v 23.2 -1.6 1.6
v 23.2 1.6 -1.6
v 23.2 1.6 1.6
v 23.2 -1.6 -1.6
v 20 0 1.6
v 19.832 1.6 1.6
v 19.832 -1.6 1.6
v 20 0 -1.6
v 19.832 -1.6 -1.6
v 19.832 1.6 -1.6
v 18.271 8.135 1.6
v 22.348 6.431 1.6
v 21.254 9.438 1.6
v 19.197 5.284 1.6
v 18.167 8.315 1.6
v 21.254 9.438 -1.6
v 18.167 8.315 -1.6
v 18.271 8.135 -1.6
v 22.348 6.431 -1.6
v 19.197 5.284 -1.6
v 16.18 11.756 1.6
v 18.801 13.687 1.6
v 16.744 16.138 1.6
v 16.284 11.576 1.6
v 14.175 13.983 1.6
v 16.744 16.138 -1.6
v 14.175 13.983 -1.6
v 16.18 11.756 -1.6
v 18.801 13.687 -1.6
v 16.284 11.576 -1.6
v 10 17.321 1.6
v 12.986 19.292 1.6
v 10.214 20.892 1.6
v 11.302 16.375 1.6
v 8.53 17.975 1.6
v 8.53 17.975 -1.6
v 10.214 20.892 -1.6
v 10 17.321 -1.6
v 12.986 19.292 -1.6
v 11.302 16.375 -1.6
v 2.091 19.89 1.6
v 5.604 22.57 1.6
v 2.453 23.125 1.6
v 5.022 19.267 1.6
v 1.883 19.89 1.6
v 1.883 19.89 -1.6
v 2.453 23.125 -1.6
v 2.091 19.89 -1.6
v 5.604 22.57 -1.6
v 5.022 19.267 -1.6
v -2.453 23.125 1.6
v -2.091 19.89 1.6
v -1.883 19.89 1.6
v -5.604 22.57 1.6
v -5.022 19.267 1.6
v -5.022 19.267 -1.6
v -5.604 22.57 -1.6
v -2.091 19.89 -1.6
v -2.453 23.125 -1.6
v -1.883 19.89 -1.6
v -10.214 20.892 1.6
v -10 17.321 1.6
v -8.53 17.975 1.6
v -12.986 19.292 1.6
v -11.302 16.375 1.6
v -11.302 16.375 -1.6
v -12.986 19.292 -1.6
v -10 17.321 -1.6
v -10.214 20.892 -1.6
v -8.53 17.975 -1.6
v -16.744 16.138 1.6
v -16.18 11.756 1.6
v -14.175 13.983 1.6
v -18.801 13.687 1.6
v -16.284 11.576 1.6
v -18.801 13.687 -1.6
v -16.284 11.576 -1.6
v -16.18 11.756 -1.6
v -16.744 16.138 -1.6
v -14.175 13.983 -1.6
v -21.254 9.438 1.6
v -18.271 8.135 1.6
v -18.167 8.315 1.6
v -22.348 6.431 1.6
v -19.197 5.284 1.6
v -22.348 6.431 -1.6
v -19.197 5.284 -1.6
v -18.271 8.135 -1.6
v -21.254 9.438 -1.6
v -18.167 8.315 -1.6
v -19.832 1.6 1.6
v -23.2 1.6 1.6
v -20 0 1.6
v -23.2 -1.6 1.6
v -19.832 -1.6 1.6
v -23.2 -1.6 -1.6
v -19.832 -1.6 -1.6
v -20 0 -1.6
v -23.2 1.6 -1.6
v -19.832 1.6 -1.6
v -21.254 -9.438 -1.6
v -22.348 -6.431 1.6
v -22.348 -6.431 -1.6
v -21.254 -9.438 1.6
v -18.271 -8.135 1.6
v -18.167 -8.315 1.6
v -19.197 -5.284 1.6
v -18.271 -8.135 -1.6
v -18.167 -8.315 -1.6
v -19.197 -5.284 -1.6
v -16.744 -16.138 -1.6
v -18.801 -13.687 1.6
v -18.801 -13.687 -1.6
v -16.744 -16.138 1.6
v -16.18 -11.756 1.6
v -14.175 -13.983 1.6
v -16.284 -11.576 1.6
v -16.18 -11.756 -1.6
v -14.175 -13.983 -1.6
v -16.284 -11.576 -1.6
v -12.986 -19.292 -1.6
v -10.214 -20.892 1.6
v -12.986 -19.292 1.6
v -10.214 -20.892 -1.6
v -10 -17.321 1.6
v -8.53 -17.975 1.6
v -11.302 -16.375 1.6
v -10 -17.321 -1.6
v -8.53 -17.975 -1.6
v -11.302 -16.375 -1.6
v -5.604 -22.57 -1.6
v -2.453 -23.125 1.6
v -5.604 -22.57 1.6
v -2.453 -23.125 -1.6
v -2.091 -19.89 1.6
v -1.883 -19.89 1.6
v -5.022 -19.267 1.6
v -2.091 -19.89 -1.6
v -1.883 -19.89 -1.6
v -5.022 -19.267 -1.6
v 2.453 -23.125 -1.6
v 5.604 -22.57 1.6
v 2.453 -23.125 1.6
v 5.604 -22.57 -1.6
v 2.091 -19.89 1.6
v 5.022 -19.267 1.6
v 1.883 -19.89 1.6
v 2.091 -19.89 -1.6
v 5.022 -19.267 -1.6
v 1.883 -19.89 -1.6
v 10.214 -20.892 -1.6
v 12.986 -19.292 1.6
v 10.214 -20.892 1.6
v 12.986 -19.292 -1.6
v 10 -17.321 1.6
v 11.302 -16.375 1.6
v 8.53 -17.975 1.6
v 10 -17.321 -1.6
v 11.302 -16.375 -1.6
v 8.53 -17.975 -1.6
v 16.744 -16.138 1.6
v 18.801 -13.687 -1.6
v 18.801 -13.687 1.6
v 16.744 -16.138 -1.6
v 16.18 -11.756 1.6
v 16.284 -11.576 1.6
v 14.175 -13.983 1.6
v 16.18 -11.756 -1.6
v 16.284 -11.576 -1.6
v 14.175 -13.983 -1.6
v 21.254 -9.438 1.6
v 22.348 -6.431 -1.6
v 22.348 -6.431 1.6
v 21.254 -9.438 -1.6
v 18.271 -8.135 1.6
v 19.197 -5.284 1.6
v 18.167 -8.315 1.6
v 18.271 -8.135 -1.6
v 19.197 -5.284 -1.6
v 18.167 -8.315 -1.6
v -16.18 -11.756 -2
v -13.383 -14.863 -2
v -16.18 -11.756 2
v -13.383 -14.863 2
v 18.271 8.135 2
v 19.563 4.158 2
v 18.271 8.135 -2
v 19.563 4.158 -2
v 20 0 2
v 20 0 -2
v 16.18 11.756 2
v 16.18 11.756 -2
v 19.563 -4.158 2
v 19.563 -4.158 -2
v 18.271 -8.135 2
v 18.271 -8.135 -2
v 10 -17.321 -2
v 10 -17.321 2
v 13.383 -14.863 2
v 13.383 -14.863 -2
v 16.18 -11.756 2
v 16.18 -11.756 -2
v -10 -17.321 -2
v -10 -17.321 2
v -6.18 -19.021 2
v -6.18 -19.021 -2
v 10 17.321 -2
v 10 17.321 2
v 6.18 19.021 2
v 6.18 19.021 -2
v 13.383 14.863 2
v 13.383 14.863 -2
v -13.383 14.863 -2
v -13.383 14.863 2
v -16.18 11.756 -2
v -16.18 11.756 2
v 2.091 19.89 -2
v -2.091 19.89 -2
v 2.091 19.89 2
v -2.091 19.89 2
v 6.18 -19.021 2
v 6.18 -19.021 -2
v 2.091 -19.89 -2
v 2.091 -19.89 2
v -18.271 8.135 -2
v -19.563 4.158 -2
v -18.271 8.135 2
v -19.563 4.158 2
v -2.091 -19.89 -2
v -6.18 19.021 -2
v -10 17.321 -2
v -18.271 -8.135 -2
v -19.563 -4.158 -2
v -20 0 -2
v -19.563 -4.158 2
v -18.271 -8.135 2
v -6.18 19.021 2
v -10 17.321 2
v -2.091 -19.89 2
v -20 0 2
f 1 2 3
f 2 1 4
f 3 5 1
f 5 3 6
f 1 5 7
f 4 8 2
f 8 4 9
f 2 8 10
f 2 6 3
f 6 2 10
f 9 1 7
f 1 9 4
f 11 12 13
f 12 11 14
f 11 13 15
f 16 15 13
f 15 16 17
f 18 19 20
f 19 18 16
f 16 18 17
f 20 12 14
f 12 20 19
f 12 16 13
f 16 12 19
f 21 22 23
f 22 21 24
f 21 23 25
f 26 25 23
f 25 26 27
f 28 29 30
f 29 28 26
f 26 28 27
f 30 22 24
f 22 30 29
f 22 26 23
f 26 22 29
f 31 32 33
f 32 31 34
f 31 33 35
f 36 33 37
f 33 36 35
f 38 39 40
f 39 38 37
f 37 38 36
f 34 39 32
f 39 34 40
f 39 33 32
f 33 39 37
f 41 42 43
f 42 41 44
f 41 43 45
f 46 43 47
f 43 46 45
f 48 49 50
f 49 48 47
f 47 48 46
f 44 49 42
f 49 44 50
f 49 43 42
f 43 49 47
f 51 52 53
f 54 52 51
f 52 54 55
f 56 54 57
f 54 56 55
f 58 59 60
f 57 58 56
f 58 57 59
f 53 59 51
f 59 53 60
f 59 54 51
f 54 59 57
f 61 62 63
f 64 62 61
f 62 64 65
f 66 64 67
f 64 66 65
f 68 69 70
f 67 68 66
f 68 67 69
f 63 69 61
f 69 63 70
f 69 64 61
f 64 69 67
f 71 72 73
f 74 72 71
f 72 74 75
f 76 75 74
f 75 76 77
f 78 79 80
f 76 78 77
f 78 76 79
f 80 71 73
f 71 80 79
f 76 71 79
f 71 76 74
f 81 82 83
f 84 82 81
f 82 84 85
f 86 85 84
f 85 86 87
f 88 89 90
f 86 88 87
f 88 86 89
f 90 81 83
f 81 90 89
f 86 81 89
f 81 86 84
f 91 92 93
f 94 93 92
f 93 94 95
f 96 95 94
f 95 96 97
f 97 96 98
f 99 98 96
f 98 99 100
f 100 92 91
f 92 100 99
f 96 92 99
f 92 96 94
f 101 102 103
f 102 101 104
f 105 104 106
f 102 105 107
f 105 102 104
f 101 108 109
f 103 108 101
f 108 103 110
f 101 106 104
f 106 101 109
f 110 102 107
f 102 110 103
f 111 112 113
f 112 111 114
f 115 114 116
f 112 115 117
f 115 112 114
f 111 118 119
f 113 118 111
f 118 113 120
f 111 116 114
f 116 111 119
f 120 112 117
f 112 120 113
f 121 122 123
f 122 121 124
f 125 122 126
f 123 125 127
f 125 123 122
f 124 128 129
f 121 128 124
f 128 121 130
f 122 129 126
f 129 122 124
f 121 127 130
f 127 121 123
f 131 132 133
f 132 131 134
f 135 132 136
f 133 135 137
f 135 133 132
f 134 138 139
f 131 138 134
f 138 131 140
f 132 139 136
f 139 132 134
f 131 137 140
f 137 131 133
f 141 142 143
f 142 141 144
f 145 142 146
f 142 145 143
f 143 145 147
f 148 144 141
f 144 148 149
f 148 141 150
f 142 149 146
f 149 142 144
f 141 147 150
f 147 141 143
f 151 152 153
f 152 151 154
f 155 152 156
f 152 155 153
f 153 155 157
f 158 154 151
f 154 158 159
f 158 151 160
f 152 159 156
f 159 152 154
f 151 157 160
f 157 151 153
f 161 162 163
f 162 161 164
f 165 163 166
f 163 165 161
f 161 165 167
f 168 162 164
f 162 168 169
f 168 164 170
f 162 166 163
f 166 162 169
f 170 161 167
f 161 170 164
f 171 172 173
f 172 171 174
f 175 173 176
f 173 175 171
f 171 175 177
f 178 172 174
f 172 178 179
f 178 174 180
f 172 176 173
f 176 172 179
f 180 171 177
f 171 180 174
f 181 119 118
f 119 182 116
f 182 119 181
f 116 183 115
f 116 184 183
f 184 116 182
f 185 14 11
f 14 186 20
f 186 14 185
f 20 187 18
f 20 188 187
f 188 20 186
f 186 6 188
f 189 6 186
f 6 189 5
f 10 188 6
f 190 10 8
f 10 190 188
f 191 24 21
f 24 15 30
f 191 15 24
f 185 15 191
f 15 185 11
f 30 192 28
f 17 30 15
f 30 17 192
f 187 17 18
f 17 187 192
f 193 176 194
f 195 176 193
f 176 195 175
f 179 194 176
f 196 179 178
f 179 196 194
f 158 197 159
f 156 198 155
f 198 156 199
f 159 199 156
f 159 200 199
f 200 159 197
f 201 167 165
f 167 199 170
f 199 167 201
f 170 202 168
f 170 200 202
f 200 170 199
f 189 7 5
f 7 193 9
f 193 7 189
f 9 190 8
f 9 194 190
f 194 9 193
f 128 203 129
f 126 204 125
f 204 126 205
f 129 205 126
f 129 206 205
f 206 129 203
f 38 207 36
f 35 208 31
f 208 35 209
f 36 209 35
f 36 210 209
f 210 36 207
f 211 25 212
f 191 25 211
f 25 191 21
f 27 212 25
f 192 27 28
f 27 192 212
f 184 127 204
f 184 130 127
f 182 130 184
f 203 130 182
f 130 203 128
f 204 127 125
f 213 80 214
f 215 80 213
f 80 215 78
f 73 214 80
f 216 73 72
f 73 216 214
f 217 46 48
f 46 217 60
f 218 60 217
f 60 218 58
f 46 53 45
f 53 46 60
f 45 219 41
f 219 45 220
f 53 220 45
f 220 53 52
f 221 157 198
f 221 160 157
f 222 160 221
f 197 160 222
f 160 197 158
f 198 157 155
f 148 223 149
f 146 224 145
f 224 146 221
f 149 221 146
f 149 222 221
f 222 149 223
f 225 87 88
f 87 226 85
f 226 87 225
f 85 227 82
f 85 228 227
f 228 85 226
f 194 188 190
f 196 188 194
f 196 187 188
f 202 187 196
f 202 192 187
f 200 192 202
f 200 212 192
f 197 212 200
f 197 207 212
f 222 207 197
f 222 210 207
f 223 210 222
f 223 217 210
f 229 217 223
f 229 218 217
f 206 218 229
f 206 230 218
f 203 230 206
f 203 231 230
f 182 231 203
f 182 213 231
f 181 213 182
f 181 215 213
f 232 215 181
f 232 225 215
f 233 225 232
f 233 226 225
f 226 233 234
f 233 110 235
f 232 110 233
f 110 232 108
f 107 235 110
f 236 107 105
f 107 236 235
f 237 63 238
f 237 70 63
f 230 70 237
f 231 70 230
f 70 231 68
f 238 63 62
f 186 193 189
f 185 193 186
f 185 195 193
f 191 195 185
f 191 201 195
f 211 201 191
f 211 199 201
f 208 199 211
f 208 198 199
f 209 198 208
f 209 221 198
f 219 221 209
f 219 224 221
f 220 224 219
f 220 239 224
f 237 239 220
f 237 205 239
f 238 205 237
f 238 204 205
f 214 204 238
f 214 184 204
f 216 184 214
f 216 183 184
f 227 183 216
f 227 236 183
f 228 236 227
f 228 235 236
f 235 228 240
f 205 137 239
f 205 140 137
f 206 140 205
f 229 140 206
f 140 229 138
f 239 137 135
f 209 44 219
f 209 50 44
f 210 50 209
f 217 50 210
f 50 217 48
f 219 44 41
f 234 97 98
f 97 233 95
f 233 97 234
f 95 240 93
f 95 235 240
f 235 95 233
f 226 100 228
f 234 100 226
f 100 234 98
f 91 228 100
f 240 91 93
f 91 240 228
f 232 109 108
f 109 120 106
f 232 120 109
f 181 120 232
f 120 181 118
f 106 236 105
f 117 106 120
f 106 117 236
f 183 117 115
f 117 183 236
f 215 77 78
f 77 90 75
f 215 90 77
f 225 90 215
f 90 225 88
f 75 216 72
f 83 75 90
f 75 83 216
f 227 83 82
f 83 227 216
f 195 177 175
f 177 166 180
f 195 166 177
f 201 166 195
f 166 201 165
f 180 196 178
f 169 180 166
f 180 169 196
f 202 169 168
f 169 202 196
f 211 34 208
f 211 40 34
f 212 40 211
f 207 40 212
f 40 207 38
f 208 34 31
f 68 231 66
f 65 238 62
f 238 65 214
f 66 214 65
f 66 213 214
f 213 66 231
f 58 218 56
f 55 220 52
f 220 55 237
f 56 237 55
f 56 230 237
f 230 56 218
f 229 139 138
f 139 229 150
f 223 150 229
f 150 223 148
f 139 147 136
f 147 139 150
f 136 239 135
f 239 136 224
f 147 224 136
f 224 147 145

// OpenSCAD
gear_radius = 20;
gear_thickness = 4;

teeth = 18;
teeth_thickness = gear_thickness * 0.8;
teeth_length = teeth_thickness;

module gear() {
	cylinder(r=gear_radius, h=gear_thickness, center=true);
    for (r=[0:teeth]) {
        rotate([0, 0, r*360/teeth])
          translate([gear_radius, 0, 0])
          cube([teeth_length*2, teeth_thickness, teeth_thickness], center=true);
    }
}

gear();
